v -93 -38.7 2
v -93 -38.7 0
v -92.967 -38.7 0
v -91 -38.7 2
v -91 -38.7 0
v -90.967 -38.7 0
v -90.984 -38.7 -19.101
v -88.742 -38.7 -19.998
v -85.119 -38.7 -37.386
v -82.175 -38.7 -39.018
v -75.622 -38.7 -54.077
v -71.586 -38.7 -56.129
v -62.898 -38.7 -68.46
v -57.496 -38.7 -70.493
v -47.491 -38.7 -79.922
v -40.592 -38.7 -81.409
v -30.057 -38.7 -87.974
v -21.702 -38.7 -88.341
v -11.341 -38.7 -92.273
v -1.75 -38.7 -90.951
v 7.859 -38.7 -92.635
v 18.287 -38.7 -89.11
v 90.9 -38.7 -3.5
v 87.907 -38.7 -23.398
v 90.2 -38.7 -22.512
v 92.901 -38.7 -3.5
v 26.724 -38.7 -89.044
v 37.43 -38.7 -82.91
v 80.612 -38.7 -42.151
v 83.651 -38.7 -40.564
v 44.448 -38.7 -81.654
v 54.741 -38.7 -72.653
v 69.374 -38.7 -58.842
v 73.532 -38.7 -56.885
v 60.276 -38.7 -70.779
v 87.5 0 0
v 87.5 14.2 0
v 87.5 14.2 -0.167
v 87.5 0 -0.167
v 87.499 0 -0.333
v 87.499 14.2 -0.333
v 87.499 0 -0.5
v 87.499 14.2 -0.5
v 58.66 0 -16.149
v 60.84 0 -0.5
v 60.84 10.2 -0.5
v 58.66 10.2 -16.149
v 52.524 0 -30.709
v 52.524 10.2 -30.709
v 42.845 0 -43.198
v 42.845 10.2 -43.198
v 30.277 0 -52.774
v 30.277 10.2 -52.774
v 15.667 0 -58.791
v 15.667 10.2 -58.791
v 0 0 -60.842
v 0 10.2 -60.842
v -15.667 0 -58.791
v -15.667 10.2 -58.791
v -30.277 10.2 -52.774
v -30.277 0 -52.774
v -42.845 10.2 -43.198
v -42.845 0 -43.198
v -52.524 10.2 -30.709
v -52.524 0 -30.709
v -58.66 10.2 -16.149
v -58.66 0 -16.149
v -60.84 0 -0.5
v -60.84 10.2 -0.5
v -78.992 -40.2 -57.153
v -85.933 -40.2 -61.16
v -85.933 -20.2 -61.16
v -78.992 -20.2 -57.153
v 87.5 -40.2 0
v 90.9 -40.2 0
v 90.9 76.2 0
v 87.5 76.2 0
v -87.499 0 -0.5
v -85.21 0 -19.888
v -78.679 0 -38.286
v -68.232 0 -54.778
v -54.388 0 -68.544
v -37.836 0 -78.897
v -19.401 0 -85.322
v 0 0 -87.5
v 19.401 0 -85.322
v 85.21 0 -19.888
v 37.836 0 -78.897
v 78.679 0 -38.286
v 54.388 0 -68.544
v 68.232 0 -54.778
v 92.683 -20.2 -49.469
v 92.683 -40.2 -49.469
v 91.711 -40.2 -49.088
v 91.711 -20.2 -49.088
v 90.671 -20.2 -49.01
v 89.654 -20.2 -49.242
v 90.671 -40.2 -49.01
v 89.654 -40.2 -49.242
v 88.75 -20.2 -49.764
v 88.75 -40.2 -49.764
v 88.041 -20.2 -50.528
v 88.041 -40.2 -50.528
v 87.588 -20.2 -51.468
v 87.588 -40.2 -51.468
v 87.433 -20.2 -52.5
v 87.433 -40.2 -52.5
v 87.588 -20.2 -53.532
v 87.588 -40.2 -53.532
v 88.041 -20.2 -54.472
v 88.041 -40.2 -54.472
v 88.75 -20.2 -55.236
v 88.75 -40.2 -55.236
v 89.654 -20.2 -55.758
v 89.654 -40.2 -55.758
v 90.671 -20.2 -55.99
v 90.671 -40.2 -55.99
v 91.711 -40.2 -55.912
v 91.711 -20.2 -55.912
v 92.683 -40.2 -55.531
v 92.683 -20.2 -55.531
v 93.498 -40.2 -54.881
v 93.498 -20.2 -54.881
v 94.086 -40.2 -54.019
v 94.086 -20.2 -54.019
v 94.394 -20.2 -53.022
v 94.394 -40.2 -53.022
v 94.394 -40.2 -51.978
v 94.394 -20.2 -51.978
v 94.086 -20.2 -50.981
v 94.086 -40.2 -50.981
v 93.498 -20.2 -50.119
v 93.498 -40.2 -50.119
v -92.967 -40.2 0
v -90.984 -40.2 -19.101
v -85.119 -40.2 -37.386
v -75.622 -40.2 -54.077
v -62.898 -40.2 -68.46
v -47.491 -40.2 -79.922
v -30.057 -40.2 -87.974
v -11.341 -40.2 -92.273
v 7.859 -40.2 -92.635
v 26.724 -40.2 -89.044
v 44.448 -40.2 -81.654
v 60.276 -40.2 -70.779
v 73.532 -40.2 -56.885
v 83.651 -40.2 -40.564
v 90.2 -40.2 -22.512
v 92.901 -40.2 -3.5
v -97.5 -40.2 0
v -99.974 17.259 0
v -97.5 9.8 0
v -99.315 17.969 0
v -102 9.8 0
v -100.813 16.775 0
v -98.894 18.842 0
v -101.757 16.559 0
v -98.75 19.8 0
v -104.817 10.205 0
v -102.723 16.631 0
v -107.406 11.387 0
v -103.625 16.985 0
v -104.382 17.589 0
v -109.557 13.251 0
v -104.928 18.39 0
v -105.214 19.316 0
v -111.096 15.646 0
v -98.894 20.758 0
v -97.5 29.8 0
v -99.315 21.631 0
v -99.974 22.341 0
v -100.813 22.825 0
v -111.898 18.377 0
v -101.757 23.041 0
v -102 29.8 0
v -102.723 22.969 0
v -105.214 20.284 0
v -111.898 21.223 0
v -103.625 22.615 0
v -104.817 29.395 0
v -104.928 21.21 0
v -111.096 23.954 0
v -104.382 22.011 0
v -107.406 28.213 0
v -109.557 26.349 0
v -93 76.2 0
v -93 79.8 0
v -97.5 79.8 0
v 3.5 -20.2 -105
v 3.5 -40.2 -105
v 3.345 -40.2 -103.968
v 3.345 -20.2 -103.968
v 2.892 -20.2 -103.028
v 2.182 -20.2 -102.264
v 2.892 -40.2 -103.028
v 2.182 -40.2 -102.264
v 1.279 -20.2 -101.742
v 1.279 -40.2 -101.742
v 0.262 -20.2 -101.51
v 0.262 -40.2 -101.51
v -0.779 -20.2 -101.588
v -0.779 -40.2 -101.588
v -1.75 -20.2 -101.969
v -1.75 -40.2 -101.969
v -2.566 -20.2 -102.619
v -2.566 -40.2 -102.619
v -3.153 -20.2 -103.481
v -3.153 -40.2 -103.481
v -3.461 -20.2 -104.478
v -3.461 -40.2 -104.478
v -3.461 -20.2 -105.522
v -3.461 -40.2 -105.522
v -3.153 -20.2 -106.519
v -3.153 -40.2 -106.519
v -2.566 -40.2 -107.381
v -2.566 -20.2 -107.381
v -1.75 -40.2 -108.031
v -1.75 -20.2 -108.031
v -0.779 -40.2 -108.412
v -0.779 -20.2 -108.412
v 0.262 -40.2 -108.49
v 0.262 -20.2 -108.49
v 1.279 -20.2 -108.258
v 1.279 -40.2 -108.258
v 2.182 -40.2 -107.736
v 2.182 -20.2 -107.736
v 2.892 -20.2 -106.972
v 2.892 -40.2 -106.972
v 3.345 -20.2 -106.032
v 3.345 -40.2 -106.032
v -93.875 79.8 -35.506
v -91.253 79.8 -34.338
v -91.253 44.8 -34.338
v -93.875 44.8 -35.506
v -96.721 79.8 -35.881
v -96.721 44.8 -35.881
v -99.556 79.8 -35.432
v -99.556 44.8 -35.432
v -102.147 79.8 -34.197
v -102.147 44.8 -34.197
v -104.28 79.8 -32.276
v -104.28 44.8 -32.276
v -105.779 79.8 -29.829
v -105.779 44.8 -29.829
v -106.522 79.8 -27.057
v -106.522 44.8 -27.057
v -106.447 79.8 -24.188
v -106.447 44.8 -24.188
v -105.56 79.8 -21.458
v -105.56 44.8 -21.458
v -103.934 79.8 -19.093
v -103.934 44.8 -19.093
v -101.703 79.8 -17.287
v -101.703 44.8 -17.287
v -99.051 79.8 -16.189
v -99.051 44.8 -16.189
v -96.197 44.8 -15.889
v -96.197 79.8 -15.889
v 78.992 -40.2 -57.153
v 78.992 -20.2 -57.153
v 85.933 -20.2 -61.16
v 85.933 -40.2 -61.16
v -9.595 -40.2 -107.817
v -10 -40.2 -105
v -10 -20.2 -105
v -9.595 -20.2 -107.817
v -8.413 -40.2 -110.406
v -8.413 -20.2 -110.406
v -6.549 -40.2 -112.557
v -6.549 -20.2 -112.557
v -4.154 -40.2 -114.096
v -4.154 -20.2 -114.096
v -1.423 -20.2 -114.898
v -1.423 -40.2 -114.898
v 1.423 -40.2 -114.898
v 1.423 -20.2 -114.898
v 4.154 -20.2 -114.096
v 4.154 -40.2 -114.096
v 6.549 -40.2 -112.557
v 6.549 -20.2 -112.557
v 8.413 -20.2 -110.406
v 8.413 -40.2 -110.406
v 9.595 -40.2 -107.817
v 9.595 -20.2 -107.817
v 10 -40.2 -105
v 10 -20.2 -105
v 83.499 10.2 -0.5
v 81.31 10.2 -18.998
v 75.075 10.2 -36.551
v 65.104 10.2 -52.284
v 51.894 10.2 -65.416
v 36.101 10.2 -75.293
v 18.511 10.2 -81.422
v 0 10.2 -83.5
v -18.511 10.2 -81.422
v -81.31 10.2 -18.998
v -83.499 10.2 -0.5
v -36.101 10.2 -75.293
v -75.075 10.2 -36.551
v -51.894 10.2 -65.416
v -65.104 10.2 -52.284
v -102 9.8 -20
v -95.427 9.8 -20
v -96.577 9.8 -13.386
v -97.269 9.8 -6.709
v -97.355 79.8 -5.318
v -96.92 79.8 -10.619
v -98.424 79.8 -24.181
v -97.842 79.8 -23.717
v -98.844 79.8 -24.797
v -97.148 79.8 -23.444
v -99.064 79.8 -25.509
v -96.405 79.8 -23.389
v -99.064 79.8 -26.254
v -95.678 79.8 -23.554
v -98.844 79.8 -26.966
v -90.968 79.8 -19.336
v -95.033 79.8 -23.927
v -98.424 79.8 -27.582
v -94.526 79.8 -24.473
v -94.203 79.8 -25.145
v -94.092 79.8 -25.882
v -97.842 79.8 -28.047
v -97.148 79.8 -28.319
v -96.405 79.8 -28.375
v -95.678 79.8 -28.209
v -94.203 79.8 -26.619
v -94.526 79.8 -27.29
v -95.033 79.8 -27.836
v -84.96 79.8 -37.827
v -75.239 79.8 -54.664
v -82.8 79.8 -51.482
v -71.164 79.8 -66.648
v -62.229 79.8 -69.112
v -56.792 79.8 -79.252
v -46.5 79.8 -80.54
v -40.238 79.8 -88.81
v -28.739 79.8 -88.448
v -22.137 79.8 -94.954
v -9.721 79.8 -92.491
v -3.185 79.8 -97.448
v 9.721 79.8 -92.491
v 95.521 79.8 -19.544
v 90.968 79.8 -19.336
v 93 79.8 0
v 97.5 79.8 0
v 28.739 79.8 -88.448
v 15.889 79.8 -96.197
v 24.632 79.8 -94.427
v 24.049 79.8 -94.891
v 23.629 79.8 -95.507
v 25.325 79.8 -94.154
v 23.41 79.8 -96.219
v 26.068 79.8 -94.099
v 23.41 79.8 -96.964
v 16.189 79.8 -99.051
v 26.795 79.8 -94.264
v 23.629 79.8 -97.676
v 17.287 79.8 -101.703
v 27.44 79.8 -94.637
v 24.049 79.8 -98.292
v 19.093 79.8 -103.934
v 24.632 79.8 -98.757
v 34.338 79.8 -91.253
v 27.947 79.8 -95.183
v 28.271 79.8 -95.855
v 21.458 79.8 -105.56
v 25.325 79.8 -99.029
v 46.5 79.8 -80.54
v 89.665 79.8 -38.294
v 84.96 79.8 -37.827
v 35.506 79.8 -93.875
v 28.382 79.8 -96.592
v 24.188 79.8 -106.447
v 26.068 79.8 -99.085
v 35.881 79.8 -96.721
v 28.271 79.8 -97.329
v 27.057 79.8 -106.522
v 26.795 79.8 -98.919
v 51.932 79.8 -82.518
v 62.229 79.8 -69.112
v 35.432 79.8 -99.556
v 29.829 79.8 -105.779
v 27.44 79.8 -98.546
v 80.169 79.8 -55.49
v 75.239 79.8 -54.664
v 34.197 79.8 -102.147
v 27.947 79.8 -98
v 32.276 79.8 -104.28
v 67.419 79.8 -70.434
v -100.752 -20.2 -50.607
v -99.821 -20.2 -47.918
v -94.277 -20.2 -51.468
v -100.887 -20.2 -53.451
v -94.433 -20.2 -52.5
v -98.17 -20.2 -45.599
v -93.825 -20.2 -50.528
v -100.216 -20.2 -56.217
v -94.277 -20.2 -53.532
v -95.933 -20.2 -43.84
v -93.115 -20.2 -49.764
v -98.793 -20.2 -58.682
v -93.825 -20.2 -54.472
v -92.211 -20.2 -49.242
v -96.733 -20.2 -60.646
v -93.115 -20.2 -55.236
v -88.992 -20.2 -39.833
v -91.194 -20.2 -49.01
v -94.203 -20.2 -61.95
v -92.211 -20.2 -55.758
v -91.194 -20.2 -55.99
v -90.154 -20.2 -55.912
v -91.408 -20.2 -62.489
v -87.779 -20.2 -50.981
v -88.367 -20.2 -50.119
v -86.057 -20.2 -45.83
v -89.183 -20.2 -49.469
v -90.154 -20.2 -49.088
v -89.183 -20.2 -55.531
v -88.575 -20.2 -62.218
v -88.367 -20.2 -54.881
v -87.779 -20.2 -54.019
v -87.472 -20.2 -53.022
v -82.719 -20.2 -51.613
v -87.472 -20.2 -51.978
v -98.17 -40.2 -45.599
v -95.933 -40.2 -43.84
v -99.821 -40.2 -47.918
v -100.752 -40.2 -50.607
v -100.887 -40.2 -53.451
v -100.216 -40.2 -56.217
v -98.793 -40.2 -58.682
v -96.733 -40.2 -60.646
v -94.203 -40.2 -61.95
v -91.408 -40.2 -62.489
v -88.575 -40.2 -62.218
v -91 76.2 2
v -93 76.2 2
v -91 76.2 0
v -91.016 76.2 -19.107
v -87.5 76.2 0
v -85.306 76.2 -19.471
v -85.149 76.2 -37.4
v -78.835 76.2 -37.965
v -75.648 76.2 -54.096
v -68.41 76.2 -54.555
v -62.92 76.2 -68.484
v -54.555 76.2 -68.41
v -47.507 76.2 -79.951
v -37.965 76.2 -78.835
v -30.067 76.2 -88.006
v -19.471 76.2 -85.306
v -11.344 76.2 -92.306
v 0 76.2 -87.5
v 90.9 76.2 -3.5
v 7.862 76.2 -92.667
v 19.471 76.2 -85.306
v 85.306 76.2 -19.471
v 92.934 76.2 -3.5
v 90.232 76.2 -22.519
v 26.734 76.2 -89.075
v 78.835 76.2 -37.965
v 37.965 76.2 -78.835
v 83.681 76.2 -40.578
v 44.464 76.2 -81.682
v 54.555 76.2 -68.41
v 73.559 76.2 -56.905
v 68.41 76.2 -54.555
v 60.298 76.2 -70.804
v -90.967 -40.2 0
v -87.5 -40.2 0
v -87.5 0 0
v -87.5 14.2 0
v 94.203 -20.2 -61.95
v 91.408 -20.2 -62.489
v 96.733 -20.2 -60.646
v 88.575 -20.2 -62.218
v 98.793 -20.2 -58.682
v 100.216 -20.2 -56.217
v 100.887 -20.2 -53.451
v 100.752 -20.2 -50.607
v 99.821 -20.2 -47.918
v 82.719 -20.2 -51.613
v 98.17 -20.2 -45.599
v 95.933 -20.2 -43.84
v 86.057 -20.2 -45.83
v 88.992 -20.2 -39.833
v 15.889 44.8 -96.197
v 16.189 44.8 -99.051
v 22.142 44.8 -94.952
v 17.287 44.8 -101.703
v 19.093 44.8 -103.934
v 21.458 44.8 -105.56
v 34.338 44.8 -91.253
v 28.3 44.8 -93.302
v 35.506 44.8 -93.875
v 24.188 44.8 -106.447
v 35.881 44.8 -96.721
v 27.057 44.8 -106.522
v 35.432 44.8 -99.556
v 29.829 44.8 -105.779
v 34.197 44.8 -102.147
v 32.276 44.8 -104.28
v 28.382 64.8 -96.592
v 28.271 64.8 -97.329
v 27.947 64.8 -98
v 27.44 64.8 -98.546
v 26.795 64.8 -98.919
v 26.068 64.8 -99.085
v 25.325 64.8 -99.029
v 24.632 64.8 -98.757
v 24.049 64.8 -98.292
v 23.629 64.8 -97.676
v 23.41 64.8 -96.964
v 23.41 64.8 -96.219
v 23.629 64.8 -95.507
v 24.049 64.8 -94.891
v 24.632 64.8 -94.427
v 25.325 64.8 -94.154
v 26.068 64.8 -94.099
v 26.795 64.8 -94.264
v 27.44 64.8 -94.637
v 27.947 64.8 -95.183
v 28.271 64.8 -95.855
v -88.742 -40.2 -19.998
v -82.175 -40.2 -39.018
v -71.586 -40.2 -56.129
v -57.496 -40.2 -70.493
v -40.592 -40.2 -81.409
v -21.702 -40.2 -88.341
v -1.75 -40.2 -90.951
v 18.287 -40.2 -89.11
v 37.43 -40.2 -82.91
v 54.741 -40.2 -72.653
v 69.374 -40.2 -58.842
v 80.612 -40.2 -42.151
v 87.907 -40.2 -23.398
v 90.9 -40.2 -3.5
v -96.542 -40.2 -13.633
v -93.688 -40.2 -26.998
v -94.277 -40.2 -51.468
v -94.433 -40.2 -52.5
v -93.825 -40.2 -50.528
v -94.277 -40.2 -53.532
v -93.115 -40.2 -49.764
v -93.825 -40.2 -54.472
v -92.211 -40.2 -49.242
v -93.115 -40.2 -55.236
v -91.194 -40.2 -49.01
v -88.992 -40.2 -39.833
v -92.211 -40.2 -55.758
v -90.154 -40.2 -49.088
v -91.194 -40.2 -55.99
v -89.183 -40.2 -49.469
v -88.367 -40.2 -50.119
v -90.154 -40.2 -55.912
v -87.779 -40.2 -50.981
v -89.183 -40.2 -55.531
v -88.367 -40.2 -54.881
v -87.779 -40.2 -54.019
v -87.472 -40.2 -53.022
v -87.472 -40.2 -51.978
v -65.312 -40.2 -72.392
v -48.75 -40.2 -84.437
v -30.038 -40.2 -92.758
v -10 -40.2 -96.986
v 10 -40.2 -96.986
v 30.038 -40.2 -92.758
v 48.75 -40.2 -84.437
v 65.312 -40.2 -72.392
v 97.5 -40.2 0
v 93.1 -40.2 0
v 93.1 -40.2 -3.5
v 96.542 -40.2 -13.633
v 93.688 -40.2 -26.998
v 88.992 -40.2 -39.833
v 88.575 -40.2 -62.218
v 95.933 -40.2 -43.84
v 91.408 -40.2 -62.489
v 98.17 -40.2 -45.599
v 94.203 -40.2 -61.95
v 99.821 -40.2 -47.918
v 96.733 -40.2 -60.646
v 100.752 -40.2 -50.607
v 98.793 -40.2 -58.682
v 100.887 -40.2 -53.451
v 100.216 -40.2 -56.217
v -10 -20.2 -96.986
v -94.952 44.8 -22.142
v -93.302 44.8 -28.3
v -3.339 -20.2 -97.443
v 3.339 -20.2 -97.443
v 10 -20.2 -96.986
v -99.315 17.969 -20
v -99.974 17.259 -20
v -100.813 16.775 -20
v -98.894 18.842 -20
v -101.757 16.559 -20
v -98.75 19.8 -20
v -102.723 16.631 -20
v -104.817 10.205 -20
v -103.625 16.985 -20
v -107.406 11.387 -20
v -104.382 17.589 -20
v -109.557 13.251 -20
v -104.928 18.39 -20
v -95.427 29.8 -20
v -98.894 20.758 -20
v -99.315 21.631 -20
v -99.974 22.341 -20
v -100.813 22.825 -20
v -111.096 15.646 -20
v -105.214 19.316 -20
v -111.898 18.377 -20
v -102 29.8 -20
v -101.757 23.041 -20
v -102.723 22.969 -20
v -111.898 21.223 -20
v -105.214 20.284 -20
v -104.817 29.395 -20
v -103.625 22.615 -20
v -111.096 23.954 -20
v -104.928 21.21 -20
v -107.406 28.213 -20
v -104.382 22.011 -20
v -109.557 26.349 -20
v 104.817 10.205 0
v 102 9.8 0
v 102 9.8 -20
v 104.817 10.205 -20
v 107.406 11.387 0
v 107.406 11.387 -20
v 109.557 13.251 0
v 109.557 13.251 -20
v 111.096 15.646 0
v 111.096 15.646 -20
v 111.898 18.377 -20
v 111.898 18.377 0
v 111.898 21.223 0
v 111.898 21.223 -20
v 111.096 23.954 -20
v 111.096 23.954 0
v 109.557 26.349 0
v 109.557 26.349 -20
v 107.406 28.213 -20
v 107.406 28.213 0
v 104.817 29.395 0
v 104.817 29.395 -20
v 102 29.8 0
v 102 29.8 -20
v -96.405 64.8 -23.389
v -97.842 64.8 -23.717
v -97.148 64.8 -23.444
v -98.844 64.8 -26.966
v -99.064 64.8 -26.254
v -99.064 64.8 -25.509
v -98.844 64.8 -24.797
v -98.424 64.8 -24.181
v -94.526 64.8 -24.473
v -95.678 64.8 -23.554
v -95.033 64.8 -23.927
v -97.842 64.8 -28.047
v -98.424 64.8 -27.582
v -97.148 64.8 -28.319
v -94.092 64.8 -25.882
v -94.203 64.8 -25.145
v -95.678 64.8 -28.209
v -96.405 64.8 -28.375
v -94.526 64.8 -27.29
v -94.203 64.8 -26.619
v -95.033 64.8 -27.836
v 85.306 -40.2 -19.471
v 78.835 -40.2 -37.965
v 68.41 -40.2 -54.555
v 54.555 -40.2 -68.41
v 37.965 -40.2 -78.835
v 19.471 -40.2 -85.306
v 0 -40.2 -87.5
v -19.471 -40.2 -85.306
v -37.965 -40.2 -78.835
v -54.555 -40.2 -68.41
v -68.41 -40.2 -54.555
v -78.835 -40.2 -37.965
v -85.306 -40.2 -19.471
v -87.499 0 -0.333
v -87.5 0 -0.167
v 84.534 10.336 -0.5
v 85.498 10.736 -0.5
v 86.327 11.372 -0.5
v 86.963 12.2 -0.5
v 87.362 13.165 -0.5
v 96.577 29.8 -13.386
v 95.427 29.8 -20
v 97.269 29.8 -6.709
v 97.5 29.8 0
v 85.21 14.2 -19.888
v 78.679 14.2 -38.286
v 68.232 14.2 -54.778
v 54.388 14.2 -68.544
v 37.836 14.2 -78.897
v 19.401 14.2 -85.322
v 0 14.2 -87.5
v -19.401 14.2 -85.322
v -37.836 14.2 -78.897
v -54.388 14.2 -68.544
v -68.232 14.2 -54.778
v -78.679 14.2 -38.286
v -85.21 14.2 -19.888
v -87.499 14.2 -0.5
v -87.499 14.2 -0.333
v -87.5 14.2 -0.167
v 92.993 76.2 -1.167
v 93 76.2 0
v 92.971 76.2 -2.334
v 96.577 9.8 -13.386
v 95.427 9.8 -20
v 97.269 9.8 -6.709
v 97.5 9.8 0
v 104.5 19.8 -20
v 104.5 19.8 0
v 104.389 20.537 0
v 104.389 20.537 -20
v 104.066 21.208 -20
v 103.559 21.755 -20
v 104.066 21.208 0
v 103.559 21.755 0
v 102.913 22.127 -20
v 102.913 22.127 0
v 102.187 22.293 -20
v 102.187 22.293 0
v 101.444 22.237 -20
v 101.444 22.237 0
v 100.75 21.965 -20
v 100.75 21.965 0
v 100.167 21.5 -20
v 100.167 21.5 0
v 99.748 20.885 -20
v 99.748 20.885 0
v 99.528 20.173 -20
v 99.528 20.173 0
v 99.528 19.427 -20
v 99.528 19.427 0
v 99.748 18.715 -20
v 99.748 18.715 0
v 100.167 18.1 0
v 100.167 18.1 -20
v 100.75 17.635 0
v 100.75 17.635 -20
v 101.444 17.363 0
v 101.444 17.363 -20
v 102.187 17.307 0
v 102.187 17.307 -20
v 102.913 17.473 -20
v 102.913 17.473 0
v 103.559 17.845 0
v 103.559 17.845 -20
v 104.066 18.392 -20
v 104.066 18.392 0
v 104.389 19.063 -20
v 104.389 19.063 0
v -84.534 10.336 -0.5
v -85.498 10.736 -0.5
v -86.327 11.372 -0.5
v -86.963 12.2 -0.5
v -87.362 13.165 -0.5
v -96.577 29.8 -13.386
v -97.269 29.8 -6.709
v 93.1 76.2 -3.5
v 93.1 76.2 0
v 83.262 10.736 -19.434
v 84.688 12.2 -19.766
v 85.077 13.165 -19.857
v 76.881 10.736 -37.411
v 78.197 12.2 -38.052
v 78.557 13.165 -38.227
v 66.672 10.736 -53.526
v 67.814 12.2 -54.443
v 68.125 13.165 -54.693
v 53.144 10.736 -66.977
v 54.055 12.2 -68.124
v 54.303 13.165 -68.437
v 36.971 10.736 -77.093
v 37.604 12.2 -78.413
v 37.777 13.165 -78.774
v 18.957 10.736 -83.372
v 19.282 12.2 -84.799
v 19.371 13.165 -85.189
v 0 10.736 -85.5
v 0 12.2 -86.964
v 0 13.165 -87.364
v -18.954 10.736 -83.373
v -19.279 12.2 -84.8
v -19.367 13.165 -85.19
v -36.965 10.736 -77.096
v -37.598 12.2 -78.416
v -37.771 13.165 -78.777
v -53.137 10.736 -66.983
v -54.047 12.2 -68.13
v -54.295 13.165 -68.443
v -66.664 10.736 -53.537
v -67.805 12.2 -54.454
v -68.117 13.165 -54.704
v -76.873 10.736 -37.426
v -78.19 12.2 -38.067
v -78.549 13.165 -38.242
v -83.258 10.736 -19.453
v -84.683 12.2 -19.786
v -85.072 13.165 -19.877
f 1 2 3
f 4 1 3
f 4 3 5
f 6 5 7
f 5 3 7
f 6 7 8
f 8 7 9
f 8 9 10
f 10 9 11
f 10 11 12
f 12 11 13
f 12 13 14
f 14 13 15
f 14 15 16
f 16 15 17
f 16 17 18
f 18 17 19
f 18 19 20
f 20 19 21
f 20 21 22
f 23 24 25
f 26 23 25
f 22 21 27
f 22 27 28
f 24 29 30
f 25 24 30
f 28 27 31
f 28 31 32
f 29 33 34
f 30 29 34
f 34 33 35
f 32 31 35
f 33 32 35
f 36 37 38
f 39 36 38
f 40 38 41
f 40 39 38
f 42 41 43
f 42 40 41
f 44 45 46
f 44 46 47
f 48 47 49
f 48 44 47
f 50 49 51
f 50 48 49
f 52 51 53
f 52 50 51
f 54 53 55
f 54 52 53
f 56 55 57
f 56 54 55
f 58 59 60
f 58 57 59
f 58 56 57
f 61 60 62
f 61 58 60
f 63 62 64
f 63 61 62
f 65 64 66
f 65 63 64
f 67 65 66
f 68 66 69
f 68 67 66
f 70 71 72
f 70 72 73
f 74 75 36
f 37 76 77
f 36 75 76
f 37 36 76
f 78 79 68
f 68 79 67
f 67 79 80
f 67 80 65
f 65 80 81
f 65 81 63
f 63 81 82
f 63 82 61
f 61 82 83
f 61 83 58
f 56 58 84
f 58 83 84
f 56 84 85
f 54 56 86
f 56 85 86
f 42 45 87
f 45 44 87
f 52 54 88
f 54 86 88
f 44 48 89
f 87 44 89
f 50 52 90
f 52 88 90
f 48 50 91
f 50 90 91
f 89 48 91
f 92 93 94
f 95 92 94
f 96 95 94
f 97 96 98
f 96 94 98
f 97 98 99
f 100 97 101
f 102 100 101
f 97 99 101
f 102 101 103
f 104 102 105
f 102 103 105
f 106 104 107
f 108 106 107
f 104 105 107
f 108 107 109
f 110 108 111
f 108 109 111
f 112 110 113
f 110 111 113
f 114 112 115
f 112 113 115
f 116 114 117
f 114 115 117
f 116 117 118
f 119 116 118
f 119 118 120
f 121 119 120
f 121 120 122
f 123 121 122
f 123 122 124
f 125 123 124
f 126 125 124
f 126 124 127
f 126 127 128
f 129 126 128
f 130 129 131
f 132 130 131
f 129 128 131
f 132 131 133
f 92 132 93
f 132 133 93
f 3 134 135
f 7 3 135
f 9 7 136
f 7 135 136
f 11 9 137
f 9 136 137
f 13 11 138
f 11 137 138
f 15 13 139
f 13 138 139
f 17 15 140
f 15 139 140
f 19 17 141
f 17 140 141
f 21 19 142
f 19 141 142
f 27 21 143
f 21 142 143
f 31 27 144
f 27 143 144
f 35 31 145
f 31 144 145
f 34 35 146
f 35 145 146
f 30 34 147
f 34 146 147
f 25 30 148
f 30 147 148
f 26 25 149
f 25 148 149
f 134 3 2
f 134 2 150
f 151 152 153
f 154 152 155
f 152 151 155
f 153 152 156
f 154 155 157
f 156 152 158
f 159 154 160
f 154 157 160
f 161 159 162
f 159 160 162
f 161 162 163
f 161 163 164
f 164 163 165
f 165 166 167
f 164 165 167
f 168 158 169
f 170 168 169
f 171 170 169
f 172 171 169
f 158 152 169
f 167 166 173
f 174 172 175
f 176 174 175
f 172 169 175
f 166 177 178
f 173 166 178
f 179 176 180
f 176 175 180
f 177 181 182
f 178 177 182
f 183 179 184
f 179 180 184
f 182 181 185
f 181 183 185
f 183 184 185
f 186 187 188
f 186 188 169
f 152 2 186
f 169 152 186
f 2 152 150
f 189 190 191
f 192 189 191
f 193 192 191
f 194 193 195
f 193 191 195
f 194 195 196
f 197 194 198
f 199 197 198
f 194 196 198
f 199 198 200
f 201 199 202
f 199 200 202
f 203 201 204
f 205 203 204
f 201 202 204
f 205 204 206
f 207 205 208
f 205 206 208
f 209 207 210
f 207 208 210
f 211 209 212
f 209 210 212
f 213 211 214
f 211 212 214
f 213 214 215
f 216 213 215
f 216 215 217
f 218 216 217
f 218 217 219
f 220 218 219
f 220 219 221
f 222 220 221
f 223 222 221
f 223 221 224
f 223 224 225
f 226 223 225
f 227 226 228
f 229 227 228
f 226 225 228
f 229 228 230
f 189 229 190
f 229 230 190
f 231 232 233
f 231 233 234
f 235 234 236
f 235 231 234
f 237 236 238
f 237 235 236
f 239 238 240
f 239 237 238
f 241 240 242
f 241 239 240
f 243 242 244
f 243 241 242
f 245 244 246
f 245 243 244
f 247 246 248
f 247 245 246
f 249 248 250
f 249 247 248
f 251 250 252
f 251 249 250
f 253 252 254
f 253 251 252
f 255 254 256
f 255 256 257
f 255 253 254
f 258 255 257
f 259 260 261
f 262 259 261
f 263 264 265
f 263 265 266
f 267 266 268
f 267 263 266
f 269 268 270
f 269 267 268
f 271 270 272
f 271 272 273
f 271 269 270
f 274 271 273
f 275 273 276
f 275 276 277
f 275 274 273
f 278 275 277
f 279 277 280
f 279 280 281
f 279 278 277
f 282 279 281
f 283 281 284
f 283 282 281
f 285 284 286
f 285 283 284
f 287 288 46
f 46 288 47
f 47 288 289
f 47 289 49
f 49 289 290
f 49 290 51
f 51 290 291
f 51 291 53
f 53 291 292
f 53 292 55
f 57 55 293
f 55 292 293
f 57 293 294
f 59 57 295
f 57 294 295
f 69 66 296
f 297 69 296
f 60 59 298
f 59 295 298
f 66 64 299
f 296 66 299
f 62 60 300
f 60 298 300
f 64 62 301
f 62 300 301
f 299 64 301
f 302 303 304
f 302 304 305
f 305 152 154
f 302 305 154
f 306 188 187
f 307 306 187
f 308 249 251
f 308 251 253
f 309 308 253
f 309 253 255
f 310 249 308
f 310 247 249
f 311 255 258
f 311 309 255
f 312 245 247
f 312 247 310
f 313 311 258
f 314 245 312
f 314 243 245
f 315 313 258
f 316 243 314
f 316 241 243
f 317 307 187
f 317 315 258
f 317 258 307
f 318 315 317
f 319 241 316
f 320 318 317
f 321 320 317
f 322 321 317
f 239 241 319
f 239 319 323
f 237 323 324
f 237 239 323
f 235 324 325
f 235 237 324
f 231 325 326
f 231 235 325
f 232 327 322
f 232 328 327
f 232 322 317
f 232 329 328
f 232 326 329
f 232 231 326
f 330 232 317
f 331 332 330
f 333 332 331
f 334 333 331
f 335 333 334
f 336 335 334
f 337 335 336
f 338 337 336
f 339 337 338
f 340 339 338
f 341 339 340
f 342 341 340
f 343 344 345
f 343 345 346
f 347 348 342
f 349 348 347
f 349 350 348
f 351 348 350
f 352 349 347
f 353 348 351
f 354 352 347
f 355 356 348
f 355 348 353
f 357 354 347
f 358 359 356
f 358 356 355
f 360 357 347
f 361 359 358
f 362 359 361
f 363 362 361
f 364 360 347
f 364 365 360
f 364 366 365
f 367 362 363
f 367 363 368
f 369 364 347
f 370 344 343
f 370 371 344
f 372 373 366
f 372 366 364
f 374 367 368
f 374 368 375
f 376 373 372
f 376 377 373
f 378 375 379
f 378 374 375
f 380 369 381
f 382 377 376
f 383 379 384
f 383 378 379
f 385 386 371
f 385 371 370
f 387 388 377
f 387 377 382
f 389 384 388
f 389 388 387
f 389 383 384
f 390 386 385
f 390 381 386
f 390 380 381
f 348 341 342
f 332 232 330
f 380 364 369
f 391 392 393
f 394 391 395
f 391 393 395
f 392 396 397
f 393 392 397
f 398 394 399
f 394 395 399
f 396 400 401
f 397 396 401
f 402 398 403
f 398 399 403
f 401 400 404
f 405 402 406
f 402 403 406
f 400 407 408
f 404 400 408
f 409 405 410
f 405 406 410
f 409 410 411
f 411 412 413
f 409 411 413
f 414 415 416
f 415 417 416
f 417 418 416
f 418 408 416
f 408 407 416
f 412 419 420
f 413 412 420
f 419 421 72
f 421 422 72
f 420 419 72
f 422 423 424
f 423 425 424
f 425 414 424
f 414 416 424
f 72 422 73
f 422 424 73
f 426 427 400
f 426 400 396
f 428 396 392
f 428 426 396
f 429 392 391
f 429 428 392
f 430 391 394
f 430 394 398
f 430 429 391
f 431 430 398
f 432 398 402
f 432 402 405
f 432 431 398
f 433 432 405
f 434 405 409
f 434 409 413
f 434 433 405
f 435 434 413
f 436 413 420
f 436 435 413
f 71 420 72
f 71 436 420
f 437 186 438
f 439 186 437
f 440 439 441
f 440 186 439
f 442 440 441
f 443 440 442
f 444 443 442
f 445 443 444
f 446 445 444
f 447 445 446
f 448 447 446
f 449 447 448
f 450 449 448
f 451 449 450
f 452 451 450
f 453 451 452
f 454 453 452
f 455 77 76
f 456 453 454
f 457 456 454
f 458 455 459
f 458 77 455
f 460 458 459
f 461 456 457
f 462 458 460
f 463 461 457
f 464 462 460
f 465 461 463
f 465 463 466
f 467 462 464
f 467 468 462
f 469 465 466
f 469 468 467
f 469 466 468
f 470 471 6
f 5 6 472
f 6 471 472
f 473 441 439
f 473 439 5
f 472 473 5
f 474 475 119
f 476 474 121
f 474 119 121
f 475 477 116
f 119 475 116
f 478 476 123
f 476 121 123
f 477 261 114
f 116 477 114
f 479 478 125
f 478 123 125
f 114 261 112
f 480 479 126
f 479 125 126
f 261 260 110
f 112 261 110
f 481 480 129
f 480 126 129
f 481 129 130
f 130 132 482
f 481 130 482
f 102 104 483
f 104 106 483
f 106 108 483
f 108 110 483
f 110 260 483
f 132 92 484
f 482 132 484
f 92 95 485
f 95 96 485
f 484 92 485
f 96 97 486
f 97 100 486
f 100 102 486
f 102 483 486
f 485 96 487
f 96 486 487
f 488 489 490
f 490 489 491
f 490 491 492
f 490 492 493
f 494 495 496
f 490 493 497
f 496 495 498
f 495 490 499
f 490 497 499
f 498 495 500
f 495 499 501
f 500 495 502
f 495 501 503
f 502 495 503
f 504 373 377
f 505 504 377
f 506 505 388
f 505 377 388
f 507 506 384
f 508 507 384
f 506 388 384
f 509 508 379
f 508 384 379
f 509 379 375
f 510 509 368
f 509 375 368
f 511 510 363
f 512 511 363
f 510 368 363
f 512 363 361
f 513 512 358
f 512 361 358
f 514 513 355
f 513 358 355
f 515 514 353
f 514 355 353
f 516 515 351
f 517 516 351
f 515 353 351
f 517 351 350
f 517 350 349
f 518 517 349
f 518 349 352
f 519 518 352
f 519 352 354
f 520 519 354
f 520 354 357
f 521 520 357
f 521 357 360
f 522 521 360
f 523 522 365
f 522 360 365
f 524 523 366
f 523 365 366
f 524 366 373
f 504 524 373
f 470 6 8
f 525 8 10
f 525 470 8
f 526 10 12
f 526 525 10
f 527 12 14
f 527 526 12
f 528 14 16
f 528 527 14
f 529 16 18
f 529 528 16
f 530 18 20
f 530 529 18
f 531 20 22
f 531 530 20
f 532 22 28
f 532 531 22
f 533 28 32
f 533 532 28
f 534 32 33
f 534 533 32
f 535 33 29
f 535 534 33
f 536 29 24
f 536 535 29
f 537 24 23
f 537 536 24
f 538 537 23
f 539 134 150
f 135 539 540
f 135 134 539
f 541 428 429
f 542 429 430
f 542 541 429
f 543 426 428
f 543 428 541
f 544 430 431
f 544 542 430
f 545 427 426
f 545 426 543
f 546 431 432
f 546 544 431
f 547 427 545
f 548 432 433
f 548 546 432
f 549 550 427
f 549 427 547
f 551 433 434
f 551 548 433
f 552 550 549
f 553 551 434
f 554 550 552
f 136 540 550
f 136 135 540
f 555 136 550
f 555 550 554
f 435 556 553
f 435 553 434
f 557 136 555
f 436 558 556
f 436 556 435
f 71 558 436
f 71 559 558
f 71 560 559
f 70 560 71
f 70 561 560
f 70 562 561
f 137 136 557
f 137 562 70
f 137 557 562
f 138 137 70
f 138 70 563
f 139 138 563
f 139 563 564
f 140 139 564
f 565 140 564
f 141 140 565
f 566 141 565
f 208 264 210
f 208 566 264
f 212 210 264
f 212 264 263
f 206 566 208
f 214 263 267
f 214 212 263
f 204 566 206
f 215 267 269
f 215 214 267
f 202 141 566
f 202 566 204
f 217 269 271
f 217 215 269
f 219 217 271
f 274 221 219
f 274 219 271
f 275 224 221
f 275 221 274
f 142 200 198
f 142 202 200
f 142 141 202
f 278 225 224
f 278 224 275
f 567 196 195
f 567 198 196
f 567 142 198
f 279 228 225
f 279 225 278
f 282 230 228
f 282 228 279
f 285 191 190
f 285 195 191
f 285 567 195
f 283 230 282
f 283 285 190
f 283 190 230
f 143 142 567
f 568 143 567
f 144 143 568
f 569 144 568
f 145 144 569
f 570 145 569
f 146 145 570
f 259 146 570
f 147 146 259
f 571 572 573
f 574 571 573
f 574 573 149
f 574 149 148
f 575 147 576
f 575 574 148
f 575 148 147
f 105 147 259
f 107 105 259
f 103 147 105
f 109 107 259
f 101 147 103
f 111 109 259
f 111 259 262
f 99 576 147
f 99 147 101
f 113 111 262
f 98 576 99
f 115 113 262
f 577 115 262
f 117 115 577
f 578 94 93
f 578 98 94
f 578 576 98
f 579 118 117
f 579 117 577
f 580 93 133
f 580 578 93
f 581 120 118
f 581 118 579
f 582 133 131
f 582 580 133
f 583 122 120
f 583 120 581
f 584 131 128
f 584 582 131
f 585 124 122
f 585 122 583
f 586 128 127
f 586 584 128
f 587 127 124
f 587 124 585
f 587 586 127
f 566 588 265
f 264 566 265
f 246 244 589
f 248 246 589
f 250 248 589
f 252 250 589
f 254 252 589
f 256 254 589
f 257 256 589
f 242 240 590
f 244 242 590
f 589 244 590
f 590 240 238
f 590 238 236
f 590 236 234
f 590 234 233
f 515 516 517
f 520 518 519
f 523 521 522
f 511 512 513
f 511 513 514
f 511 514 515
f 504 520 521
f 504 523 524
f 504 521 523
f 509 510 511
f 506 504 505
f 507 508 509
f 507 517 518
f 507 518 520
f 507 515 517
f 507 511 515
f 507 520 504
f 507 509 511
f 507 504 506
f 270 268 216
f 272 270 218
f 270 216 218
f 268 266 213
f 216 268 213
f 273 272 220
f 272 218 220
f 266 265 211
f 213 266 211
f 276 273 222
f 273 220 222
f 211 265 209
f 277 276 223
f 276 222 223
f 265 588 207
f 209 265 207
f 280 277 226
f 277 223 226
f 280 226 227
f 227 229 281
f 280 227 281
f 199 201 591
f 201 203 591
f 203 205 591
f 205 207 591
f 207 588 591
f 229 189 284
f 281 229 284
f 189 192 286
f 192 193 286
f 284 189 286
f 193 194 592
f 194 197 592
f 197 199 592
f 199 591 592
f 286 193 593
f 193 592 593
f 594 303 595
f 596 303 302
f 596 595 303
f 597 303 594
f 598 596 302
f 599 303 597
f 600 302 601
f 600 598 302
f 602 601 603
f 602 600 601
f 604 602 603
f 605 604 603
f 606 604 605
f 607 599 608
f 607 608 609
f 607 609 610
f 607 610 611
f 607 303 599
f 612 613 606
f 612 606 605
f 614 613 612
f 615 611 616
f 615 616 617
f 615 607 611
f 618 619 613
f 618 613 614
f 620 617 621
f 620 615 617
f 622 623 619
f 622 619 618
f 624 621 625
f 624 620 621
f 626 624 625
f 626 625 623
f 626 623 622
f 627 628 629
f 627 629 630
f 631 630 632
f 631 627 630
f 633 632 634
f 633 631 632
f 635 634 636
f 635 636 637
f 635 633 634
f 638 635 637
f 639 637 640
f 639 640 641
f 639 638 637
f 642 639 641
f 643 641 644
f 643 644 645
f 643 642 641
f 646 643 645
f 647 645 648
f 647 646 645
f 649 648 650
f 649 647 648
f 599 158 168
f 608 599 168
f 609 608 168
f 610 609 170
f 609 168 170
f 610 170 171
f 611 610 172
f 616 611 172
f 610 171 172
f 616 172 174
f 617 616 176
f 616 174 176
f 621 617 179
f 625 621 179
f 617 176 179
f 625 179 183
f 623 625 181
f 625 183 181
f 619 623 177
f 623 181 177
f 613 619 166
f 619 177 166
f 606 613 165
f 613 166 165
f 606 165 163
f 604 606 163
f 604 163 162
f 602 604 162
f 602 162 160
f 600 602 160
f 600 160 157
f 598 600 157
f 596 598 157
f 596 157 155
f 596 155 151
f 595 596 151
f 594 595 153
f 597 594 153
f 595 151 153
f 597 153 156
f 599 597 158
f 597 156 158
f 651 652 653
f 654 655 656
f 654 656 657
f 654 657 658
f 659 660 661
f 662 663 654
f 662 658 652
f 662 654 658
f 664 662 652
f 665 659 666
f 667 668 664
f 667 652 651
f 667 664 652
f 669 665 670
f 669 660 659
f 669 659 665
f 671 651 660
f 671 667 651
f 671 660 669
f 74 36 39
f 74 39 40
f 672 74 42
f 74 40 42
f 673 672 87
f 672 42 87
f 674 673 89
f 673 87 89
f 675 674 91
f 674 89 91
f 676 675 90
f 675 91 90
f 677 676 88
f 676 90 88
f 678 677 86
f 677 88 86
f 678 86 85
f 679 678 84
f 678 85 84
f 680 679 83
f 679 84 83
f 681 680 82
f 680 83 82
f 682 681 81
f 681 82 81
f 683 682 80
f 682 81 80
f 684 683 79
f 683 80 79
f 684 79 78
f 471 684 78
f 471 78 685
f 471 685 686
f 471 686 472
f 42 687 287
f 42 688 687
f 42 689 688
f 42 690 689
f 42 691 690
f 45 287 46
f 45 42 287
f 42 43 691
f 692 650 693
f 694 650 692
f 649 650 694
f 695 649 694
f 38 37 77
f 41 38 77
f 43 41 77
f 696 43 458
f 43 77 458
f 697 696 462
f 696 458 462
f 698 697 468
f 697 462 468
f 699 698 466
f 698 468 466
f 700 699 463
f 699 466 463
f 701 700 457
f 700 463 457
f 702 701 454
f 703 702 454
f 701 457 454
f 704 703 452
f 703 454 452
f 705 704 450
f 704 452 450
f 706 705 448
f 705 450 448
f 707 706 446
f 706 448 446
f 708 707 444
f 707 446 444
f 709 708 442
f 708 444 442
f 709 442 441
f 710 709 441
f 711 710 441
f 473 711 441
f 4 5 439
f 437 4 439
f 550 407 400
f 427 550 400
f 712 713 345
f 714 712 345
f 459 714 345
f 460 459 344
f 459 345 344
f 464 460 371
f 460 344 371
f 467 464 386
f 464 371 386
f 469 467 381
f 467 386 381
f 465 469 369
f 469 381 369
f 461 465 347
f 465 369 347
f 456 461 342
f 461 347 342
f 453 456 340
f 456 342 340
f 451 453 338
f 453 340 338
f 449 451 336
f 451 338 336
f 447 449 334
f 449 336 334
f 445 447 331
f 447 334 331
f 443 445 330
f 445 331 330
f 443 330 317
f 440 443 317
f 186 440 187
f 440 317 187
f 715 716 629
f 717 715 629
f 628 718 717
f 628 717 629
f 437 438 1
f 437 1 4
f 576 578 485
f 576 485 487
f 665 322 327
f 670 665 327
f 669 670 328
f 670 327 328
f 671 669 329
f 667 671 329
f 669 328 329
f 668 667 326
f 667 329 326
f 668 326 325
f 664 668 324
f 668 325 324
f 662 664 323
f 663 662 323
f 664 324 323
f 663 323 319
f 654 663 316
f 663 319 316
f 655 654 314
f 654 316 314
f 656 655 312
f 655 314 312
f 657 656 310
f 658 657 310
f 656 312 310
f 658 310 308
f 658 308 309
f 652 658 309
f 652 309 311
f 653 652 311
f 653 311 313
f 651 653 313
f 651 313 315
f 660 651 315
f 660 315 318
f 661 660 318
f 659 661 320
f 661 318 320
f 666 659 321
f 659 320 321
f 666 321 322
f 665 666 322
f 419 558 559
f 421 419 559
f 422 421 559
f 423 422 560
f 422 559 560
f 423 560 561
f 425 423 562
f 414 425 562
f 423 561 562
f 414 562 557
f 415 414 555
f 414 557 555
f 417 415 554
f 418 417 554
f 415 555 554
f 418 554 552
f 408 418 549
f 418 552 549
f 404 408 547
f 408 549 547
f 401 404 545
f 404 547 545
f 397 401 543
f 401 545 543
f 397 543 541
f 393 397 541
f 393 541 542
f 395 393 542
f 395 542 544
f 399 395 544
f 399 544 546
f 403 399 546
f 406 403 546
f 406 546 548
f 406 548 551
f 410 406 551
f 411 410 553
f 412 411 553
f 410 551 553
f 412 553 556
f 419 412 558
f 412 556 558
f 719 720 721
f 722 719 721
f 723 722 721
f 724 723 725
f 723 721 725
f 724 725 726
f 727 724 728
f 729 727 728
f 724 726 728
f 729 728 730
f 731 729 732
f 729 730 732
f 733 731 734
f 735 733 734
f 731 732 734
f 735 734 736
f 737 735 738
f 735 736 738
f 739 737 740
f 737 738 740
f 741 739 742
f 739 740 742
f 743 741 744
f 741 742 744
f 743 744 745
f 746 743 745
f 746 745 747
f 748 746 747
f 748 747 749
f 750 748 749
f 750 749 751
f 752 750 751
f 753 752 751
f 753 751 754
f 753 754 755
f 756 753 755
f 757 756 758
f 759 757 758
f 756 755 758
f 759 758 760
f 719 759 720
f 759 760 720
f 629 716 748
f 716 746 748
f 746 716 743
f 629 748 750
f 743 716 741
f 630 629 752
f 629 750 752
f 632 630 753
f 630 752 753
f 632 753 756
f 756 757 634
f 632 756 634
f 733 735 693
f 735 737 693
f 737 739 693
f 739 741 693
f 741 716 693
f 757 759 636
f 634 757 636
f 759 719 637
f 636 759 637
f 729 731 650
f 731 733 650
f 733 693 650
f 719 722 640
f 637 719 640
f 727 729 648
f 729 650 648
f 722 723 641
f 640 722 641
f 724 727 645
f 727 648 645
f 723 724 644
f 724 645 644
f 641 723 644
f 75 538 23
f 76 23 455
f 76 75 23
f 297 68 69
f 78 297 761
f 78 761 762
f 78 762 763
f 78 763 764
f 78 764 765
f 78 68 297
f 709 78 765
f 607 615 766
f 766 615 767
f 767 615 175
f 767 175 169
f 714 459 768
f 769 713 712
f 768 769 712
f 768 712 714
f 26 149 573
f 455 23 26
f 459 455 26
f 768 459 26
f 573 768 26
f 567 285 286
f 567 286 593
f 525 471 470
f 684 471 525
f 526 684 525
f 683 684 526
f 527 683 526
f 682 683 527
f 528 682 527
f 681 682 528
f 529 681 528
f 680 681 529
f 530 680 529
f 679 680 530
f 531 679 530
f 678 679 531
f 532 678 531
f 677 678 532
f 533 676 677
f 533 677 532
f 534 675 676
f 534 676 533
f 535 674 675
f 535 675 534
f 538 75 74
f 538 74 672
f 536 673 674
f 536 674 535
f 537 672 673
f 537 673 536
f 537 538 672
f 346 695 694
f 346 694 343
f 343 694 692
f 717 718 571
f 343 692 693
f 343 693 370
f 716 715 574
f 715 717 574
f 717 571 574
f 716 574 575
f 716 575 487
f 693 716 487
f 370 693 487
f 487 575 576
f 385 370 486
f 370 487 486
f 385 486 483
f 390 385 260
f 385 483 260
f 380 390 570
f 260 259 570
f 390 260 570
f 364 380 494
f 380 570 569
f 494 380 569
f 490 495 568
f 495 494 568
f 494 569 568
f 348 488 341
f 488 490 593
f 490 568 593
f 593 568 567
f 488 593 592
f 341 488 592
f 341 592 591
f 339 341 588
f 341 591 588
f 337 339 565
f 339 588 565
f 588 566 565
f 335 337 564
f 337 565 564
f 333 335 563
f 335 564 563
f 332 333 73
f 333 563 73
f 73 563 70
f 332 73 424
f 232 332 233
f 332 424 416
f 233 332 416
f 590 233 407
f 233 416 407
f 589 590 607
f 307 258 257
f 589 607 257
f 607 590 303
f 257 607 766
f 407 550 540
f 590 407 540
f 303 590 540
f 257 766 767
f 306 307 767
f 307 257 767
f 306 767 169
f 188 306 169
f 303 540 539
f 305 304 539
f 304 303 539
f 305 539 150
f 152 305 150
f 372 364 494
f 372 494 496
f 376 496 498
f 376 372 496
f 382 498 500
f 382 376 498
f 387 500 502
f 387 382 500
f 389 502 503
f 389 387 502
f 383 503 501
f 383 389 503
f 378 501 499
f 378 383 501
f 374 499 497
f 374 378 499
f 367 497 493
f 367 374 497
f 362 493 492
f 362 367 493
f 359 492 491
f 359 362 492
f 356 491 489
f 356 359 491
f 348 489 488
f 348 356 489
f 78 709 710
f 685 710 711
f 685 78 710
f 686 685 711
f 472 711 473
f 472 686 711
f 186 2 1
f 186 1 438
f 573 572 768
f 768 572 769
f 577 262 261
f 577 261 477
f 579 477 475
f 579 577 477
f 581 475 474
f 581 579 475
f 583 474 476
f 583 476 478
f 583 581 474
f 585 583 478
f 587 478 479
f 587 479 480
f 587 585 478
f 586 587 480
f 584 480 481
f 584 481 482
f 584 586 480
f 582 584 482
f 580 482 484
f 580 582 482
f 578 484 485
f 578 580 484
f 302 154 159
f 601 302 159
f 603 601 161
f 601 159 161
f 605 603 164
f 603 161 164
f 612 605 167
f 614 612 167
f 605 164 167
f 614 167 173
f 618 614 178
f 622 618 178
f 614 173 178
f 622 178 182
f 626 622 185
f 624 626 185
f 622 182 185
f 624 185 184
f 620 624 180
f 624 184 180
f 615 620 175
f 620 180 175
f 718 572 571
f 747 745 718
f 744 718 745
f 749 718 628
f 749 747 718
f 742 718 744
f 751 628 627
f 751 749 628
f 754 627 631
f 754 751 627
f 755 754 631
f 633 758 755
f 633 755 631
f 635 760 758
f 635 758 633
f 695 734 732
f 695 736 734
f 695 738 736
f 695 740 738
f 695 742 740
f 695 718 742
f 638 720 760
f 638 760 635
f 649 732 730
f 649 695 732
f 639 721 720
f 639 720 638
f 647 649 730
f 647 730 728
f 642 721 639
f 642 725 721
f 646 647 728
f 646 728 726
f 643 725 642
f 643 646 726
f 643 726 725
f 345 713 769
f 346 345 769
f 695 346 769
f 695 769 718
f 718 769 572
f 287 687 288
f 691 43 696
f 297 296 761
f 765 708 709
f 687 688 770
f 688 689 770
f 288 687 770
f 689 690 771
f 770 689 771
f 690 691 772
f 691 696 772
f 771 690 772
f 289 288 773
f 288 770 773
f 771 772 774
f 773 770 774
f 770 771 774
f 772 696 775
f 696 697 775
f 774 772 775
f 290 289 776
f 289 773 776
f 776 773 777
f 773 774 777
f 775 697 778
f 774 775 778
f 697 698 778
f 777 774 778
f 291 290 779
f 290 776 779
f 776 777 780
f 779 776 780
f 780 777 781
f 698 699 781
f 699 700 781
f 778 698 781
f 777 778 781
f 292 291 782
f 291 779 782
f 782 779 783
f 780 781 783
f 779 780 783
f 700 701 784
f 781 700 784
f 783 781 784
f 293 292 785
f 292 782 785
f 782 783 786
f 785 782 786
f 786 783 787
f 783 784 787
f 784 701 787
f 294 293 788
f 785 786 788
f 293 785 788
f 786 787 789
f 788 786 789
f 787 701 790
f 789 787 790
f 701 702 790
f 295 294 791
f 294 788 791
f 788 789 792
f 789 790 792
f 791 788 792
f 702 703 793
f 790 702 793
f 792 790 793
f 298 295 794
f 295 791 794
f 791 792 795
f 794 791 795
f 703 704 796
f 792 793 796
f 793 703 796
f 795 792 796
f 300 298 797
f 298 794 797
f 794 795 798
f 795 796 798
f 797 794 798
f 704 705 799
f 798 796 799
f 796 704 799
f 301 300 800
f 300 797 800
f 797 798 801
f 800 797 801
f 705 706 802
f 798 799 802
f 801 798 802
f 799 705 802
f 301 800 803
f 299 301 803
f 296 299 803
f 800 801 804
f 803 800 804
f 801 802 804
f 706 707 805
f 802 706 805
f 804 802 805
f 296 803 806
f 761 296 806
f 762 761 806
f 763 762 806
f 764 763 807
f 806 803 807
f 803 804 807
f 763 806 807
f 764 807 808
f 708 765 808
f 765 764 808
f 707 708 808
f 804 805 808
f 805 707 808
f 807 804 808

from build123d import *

# Parameters (mm, degrees)
REVOLU_O2_ANGLE            = 180
ESBO_O4_R                  = 10
RESSALTO_EXTRUS_O1_DEPTH   = 35
RESSALTO_EXTRUS_O2_DEPTH   = 20
ESBO_O8_R                  = 3.5
CORTE_EXTRUS_O2_DEPTH      = 20
PADR_OCIRCULAR1_COUNT      = 6
ESBO_O6_R                  = 2.5
CORTE_EXTRUS_O1_DEPTH      = 15
ESBO_O10_W                 = 2.2
ESBO_O10_H                 = 116.4
CORTE_EXTRUS_O4_DEPTH      = 3.5
ESBO_O11_W                 = 2
ESBO_O11_H                 = 114.9
RESSALTO_EXTRUS_O5_DEPTH   = 2
ESBO_O12_R                 = 3.25
RESSALTO_EXTRUS_O6_DEPTH   = 20
ESBO_O13_R                 = 2.5
RESSALTO_EXTRUS_O7_DEPTH   = 20
ESBO_O16_R                 = 93
CORTE_EXTRUS_O6_DEPTH      = 10
ESBO_O17_R                 = 92.967356783
ESBO_O17_R_2               = 90.967356783
CORTE_EXTRUS_O7_DEPTH      = 1.5
CORTE_EXTRUS_O9_DEPTH      = 41.2
CORTE_EXTRUS_O9_DEPTH_BACK = 80.8


with BuildPart() as part:
    # Esboço3 → Revolução2 (revolve)
    with BuildSketch(Plane.XY):
        with BuildLine():
            Line((97.5, 79.8), (97.5, 11.304491341))
            Line((97.5, 11.304491341), (97.5, 0))
            Line((97.5, 0), (97.5, -40.2))
            Line((97.5, -40.2), (87.5, -40.2))
            Line((87.5, -40.2), (87.5, 0))
            Line((87.5, 0), (60.342408243, 0))
            Line((60.342408243, 0), (60.342408243, 10.2))
            Line((60.342408243, 10.2), (83.5, 10.2))
            ThreePointArc((83.5, 10.2), (86.328427125, 11.371572875), (87.5, 14.2))
            Line((87.5, 14.2), (87.5, 76.2))
            Line((87.5, 76.2), (93, 76.2))
            Line((93, 76.2), (93, 79.8))
            Line((93, 79.8), (97.5, 79.8))
        make_face()
    revolve(axis=Axis((0, -3.322055656, 0), (0, 1, 0)), revolution_arc=REVOLU_O2_ANGLE)

    # Esboço4 → Ressalto-extrusão1 (add)
    with BuildSketch(Plane(origin=(0, 79.8, 0), x_dir=(1, 0, 0), z_dir=(0, 1, 0))):
        with Locations((25.881656302, 96.591656302)):
            Circle(ESBO_O4_R)
        with Locations((-96.591656302, 25.881656302)):
            Circle(ESBO_O4_R)
    extrude(amount=-RESSALTO_EXTRUS_O1_DEPTH)

    # Esboço5 → Ressalto-extrusão2 (add)
    with BuildSketch(Plane.XZ.offset(40.2)):
        with BuildLine():
            Line((10, -105), (10, -96.985823706))
            Line((10, -96.985823706), (-10, -96.985823706))
            Line((-10, -96.985823706), (-10, -105))
            ThreePointArc((-10, -105), (0, -115), (10, -105))
        make_face()
    ressalto_extrus_o2 = extrude(amount=-RESSALTO_EXTRUS_O2_DEPTH)

    # Esboço8 → Corte-extrusão2 (cut)
    with BuildSketch(Plane.XZ.offset(40.2)):
        with Locations((0, -105)):
            Circle(ESBO_O8_R)
    corte_extrus_o2 = extrude(amount=-CORTE_EXTRUS_O2_DEPTH, mode=Mode.SUBTRACT)

    # PadrãoCircular1: Ressalto-extrusão2, Corte-extrusão2 ×6 about axis, 3 skipped
    padr_ocircular1_axis = Axis((0, 0, 0), (0, 1, 0))
    add([ressalto_extrus_o2.rotate(padr_ocircular1_axis, i * 360 / PADR_OCIRCULAR1_COUNT) for i in range(1, PADR_OCIRCULAR1_COUNT) if i not in (2, 3, 4)])
    add([corte_extrus_o2.rotate(padr_ocircular1_axis, i * 360 / PADR_OCIRCULAR1_COUNT) for i in range(1, PADR_OCIRCULAR1_COUNT) if i not in (2, 3, 4)], mode=Mode.SUBTRACT)

    # Esboço6 → Corte-extrusão1 (cut)
    with BuildSketch(Plane(origin=(0, 79.8, 0), x_dir=(1, 0, 0), z_dir=(0, 1, 0))):
        with Locations((25.881656302, 96.591656302)):
            Circle(ESBO_O6_R)
        with Locations((-96.591656302, 25.881656302)):
            Circle(ESBO_O6_R)
    extrude(amount=-CORTE_EXTRUS_O1_DEPTH, mode=Mode.SUBTRACT)

    # Esboço10 → Corte-extrusão4 (cut)
    with BuildSketch(Plane.XY):
        with Locations((92, 18)):
            Rectangle(ESBO_O10_W, ESBO_O10_H)
    extrude(amount=-CORTE_EXTRUS_O4_DEPTH, mode=Mode.SUBTRACT)

    # Esboço11 → Ressalto-extrusão5 (add)
    with BuildSketch(Plane.XY):
        with Locations((-92, 18.75)):
            Rectangle(ESBO_O11_W, ESBO_O11_H)
    extrude(amount=RESSALTO_EXTRUS_O5_DEPTH)

    # Esboço12 → Ressalto-extrusão6 (add)
    with BuildSketch(Plane.XY):
        with BuildLine():
            Line((-102, 29.8), (-87.5, 29.8))
            Line((-87.5, 29.8), (-87.5, 9.8))
            Line((-87.5, 9.8), (-102, 9.8))
            ThreePointArc((-102, 9.8), (-112, 19.8), (-102, 29.8))
        make_face()
        with Locations((-102, 19.8)):
            Circle(ESBO_O12_R, mode=Mode.SUBTRACT)
    extrude(amount=-RESSALTO_EXTRUS_O6_DEPTH)

    # Esboço13 → Ressalto-extrusão7 (add)
    with BuildSketch(Plane.XY):
        with BuildLine():
            Line((102, 29.8), (93.1, 29.8))
            Line((93.1, 29.8), (93.1, 9.8))
            Line((93.1, 9.8), (102, 9.8))
            ThreePointArc((102, 9.8), (112, 19.8), (102, 29.8))
        make_face()
        with Locations((102, 19.8)):
            Circle(ESBO_O13_R, mode=Mode.SUBTRACT)
    extrude(amount=-RESSALTO_EXTRUS_O7_DEPTH)

    # Esboço16 → Corte-extrusão6 (cut)
    with BuildSketch(Plane(origin=(0, 76.2, 0), x_dir=(1, 0, 0), z_dir=(0, 1, 0))):
        Circle(ESBO_O16_R)
    extrude(amount=CORTE_EXTRUS_O6_DEPTH, mode=Mode.SUBTRACT)

    # Esboço17 → Corte-extrusão7 (cut)
    with BuildSketch(Plane.XZ.offset(40.2)):
        Circle(ESBO_O17_R)
        Circle(ESBO_O17_R_2, mode=Mode.SUBTRACT)
    extrude(amount=-CORTE_EXTRUS_O7_DEPTH, mode=Mode.SUBTRACT)

    # Esboço21 → Corte-extrusão9 (cut, two sides)
    with BuildSketch(Plane.XZ) as corte_extrus_o9_sk:
        with BuildLine():
            Line((-87.5, 0), (87.5, 0))
            ThreePointArc((87.5, 0), (87.499642853, -0.25000102), (87.498571417, -0.5))
            Line((87.498571417, -0.5), (60.84035372, -0.5))
            ThreePointArc((60.84035372, -0.5), (0, -60.842408243), (-60.84035372, -0.5))
            Line((-60.84035372, -0.5), (-87.498571417, -0.5))
            ThreePointArc((-87.498571417, -0.5), (-87.499642853, -0.25000102), (-87.5, 0))
        make_face()
    extrude(amount=CORTE_EXTRUS_O9_DEPTH, mode=Mode.SUBTRACT)
    extrude(corte_extrus_o9_sk.sketch, amount=-CORTE_EXTRUS_O9_DEPTH_BACK, mode=Mode.SUBTRACT)


solid = part.part
